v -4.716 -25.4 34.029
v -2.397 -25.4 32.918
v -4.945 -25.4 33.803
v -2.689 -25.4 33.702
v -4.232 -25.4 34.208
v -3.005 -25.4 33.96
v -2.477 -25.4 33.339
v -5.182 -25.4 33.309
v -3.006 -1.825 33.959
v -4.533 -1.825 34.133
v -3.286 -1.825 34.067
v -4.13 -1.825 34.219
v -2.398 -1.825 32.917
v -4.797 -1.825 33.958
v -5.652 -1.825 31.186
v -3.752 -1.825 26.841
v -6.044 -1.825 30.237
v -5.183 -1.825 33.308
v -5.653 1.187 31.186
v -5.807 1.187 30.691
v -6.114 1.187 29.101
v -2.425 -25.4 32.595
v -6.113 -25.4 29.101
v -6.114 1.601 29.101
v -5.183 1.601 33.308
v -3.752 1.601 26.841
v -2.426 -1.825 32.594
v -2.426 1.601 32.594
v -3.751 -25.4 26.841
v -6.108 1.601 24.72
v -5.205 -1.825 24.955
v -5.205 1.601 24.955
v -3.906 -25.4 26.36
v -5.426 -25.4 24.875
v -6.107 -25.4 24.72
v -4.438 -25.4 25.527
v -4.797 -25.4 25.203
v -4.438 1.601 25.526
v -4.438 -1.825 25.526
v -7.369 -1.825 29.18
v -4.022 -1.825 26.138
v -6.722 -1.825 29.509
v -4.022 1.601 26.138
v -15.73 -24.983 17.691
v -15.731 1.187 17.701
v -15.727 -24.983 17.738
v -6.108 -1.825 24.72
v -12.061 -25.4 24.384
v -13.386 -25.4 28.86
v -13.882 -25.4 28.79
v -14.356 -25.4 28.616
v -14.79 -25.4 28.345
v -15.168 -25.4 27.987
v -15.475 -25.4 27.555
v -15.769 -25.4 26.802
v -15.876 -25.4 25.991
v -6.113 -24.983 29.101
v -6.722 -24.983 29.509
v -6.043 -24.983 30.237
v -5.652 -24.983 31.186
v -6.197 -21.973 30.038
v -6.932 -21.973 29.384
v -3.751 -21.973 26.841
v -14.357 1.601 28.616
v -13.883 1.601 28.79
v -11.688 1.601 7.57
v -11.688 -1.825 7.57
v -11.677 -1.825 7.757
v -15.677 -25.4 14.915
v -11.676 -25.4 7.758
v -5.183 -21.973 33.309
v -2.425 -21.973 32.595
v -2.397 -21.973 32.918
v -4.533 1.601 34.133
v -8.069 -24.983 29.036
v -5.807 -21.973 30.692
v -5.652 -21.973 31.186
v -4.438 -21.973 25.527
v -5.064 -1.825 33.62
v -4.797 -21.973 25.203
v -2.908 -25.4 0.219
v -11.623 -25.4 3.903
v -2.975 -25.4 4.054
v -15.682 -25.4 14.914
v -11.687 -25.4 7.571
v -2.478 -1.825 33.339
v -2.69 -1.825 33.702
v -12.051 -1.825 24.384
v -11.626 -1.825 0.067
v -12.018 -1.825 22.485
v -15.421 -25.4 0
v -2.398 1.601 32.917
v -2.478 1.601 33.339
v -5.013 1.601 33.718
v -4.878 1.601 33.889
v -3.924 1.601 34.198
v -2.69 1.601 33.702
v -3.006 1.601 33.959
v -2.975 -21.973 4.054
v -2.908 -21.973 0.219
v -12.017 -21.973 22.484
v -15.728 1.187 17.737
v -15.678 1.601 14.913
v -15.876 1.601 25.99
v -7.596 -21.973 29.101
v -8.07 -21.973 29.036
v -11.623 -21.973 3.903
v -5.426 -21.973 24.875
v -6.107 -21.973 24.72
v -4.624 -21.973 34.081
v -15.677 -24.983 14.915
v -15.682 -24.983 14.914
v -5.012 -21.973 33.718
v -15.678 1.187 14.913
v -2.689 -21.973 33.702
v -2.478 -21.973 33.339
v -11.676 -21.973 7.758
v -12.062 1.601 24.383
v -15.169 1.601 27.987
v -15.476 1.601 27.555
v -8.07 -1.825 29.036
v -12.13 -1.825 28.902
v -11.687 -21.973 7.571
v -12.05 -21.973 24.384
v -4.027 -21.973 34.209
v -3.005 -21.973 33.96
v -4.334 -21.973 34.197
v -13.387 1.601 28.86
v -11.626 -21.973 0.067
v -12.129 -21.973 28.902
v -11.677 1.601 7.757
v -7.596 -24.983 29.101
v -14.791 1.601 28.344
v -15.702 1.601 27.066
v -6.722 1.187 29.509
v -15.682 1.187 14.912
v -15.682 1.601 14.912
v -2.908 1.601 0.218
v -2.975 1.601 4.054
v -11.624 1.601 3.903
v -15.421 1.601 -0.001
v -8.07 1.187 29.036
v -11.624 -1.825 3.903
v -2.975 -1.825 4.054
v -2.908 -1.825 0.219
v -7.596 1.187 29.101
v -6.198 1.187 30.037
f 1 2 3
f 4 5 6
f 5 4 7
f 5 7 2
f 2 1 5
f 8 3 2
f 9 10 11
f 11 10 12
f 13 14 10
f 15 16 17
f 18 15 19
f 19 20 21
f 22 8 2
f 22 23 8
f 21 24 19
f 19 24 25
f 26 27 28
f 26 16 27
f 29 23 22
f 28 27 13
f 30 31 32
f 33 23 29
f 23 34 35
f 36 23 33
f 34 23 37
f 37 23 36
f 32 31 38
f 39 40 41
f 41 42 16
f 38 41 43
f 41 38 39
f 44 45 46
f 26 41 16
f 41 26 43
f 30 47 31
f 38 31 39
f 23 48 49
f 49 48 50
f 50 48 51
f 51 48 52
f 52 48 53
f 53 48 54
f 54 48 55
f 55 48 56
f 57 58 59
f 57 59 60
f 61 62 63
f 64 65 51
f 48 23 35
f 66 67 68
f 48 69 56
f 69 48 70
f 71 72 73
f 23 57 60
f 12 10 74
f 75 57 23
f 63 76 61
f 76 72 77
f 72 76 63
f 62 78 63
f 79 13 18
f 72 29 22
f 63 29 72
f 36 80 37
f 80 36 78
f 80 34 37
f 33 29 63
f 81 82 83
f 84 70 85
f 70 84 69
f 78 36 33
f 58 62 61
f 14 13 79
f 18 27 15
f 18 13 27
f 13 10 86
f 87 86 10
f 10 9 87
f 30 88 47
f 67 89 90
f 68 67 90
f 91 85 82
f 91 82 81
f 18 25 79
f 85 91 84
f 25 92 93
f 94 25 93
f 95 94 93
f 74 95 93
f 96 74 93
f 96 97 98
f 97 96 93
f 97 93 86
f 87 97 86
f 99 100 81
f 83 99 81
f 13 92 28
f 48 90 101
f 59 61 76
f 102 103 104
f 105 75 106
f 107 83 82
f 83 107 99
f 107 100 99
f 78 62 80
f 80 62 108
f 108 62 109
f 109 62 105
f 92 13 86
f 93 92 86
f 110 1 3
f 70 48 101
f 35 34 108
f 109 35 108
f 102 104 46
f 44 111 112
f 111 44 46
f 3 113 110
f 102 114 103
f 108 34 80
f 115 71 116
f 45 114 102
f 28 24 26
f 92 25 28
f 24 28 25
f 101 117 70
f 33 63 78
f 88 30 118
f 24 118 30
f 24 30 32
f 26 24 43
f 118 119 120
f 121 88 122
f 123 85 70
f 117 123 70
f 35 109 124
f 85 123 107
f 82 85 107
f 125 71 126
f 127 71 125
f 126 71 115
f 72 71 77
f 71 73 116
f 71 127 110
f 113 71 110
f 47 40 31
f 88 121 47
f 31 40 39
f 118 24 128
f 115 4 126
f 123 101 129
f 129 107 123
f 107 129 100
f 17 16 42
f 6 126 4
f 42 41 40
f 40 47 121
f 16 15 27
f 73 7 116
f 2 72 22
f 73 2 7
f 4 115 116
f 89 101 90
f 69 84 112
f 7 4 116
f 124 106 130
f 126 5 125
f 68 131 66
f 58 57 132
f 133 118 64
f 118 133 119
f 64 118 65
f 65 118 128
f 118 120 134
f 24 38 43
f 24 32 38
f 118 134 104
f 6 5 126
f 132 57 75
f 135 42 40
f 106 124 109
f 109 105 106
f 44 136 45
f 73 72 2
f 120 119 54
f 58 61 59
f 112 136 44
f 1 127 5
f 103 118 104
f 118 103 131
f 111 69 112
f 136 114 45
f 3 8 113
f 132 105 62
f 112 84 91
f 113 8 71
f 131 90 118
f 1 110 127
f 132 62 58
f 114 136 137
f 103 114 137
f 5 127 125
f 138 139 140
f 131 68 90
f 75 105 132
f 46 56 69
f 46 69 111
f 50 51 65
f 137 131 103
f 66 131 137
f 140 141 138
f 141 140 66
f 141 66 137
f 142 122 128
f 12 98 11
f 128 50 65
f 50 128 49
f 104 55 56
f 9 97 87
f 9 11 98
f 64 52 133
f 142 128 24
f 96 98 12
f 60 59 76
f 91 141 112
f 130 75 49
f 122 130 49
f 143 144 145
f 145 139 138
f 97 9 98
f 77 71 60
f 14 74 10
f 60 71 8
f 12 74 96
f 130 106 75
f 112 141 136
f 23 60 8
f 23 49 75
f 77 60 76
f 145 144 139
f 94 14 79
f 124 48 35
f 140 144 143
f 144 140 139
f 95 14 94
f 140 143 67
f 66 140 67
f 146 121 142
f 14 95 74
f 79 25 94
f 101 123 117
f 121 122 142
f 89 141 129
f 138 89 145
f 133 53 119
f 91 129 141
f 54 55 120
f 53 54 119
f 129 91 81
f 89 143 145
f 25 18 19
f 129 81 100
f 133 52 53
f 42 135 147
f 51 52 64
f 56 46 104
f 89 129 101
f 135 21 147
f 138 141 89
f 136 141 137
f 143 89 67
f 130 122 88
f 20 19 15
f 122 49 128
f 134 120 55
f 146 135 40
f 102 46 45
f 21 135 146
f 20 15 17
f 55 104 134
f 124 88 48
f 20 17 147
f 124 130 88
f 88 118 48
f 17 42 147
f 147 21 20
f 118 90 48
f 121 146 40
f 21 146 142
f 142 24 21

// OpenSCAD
use <../pegboard_2_position_blank.scad>

pegboardBlankPanel();
